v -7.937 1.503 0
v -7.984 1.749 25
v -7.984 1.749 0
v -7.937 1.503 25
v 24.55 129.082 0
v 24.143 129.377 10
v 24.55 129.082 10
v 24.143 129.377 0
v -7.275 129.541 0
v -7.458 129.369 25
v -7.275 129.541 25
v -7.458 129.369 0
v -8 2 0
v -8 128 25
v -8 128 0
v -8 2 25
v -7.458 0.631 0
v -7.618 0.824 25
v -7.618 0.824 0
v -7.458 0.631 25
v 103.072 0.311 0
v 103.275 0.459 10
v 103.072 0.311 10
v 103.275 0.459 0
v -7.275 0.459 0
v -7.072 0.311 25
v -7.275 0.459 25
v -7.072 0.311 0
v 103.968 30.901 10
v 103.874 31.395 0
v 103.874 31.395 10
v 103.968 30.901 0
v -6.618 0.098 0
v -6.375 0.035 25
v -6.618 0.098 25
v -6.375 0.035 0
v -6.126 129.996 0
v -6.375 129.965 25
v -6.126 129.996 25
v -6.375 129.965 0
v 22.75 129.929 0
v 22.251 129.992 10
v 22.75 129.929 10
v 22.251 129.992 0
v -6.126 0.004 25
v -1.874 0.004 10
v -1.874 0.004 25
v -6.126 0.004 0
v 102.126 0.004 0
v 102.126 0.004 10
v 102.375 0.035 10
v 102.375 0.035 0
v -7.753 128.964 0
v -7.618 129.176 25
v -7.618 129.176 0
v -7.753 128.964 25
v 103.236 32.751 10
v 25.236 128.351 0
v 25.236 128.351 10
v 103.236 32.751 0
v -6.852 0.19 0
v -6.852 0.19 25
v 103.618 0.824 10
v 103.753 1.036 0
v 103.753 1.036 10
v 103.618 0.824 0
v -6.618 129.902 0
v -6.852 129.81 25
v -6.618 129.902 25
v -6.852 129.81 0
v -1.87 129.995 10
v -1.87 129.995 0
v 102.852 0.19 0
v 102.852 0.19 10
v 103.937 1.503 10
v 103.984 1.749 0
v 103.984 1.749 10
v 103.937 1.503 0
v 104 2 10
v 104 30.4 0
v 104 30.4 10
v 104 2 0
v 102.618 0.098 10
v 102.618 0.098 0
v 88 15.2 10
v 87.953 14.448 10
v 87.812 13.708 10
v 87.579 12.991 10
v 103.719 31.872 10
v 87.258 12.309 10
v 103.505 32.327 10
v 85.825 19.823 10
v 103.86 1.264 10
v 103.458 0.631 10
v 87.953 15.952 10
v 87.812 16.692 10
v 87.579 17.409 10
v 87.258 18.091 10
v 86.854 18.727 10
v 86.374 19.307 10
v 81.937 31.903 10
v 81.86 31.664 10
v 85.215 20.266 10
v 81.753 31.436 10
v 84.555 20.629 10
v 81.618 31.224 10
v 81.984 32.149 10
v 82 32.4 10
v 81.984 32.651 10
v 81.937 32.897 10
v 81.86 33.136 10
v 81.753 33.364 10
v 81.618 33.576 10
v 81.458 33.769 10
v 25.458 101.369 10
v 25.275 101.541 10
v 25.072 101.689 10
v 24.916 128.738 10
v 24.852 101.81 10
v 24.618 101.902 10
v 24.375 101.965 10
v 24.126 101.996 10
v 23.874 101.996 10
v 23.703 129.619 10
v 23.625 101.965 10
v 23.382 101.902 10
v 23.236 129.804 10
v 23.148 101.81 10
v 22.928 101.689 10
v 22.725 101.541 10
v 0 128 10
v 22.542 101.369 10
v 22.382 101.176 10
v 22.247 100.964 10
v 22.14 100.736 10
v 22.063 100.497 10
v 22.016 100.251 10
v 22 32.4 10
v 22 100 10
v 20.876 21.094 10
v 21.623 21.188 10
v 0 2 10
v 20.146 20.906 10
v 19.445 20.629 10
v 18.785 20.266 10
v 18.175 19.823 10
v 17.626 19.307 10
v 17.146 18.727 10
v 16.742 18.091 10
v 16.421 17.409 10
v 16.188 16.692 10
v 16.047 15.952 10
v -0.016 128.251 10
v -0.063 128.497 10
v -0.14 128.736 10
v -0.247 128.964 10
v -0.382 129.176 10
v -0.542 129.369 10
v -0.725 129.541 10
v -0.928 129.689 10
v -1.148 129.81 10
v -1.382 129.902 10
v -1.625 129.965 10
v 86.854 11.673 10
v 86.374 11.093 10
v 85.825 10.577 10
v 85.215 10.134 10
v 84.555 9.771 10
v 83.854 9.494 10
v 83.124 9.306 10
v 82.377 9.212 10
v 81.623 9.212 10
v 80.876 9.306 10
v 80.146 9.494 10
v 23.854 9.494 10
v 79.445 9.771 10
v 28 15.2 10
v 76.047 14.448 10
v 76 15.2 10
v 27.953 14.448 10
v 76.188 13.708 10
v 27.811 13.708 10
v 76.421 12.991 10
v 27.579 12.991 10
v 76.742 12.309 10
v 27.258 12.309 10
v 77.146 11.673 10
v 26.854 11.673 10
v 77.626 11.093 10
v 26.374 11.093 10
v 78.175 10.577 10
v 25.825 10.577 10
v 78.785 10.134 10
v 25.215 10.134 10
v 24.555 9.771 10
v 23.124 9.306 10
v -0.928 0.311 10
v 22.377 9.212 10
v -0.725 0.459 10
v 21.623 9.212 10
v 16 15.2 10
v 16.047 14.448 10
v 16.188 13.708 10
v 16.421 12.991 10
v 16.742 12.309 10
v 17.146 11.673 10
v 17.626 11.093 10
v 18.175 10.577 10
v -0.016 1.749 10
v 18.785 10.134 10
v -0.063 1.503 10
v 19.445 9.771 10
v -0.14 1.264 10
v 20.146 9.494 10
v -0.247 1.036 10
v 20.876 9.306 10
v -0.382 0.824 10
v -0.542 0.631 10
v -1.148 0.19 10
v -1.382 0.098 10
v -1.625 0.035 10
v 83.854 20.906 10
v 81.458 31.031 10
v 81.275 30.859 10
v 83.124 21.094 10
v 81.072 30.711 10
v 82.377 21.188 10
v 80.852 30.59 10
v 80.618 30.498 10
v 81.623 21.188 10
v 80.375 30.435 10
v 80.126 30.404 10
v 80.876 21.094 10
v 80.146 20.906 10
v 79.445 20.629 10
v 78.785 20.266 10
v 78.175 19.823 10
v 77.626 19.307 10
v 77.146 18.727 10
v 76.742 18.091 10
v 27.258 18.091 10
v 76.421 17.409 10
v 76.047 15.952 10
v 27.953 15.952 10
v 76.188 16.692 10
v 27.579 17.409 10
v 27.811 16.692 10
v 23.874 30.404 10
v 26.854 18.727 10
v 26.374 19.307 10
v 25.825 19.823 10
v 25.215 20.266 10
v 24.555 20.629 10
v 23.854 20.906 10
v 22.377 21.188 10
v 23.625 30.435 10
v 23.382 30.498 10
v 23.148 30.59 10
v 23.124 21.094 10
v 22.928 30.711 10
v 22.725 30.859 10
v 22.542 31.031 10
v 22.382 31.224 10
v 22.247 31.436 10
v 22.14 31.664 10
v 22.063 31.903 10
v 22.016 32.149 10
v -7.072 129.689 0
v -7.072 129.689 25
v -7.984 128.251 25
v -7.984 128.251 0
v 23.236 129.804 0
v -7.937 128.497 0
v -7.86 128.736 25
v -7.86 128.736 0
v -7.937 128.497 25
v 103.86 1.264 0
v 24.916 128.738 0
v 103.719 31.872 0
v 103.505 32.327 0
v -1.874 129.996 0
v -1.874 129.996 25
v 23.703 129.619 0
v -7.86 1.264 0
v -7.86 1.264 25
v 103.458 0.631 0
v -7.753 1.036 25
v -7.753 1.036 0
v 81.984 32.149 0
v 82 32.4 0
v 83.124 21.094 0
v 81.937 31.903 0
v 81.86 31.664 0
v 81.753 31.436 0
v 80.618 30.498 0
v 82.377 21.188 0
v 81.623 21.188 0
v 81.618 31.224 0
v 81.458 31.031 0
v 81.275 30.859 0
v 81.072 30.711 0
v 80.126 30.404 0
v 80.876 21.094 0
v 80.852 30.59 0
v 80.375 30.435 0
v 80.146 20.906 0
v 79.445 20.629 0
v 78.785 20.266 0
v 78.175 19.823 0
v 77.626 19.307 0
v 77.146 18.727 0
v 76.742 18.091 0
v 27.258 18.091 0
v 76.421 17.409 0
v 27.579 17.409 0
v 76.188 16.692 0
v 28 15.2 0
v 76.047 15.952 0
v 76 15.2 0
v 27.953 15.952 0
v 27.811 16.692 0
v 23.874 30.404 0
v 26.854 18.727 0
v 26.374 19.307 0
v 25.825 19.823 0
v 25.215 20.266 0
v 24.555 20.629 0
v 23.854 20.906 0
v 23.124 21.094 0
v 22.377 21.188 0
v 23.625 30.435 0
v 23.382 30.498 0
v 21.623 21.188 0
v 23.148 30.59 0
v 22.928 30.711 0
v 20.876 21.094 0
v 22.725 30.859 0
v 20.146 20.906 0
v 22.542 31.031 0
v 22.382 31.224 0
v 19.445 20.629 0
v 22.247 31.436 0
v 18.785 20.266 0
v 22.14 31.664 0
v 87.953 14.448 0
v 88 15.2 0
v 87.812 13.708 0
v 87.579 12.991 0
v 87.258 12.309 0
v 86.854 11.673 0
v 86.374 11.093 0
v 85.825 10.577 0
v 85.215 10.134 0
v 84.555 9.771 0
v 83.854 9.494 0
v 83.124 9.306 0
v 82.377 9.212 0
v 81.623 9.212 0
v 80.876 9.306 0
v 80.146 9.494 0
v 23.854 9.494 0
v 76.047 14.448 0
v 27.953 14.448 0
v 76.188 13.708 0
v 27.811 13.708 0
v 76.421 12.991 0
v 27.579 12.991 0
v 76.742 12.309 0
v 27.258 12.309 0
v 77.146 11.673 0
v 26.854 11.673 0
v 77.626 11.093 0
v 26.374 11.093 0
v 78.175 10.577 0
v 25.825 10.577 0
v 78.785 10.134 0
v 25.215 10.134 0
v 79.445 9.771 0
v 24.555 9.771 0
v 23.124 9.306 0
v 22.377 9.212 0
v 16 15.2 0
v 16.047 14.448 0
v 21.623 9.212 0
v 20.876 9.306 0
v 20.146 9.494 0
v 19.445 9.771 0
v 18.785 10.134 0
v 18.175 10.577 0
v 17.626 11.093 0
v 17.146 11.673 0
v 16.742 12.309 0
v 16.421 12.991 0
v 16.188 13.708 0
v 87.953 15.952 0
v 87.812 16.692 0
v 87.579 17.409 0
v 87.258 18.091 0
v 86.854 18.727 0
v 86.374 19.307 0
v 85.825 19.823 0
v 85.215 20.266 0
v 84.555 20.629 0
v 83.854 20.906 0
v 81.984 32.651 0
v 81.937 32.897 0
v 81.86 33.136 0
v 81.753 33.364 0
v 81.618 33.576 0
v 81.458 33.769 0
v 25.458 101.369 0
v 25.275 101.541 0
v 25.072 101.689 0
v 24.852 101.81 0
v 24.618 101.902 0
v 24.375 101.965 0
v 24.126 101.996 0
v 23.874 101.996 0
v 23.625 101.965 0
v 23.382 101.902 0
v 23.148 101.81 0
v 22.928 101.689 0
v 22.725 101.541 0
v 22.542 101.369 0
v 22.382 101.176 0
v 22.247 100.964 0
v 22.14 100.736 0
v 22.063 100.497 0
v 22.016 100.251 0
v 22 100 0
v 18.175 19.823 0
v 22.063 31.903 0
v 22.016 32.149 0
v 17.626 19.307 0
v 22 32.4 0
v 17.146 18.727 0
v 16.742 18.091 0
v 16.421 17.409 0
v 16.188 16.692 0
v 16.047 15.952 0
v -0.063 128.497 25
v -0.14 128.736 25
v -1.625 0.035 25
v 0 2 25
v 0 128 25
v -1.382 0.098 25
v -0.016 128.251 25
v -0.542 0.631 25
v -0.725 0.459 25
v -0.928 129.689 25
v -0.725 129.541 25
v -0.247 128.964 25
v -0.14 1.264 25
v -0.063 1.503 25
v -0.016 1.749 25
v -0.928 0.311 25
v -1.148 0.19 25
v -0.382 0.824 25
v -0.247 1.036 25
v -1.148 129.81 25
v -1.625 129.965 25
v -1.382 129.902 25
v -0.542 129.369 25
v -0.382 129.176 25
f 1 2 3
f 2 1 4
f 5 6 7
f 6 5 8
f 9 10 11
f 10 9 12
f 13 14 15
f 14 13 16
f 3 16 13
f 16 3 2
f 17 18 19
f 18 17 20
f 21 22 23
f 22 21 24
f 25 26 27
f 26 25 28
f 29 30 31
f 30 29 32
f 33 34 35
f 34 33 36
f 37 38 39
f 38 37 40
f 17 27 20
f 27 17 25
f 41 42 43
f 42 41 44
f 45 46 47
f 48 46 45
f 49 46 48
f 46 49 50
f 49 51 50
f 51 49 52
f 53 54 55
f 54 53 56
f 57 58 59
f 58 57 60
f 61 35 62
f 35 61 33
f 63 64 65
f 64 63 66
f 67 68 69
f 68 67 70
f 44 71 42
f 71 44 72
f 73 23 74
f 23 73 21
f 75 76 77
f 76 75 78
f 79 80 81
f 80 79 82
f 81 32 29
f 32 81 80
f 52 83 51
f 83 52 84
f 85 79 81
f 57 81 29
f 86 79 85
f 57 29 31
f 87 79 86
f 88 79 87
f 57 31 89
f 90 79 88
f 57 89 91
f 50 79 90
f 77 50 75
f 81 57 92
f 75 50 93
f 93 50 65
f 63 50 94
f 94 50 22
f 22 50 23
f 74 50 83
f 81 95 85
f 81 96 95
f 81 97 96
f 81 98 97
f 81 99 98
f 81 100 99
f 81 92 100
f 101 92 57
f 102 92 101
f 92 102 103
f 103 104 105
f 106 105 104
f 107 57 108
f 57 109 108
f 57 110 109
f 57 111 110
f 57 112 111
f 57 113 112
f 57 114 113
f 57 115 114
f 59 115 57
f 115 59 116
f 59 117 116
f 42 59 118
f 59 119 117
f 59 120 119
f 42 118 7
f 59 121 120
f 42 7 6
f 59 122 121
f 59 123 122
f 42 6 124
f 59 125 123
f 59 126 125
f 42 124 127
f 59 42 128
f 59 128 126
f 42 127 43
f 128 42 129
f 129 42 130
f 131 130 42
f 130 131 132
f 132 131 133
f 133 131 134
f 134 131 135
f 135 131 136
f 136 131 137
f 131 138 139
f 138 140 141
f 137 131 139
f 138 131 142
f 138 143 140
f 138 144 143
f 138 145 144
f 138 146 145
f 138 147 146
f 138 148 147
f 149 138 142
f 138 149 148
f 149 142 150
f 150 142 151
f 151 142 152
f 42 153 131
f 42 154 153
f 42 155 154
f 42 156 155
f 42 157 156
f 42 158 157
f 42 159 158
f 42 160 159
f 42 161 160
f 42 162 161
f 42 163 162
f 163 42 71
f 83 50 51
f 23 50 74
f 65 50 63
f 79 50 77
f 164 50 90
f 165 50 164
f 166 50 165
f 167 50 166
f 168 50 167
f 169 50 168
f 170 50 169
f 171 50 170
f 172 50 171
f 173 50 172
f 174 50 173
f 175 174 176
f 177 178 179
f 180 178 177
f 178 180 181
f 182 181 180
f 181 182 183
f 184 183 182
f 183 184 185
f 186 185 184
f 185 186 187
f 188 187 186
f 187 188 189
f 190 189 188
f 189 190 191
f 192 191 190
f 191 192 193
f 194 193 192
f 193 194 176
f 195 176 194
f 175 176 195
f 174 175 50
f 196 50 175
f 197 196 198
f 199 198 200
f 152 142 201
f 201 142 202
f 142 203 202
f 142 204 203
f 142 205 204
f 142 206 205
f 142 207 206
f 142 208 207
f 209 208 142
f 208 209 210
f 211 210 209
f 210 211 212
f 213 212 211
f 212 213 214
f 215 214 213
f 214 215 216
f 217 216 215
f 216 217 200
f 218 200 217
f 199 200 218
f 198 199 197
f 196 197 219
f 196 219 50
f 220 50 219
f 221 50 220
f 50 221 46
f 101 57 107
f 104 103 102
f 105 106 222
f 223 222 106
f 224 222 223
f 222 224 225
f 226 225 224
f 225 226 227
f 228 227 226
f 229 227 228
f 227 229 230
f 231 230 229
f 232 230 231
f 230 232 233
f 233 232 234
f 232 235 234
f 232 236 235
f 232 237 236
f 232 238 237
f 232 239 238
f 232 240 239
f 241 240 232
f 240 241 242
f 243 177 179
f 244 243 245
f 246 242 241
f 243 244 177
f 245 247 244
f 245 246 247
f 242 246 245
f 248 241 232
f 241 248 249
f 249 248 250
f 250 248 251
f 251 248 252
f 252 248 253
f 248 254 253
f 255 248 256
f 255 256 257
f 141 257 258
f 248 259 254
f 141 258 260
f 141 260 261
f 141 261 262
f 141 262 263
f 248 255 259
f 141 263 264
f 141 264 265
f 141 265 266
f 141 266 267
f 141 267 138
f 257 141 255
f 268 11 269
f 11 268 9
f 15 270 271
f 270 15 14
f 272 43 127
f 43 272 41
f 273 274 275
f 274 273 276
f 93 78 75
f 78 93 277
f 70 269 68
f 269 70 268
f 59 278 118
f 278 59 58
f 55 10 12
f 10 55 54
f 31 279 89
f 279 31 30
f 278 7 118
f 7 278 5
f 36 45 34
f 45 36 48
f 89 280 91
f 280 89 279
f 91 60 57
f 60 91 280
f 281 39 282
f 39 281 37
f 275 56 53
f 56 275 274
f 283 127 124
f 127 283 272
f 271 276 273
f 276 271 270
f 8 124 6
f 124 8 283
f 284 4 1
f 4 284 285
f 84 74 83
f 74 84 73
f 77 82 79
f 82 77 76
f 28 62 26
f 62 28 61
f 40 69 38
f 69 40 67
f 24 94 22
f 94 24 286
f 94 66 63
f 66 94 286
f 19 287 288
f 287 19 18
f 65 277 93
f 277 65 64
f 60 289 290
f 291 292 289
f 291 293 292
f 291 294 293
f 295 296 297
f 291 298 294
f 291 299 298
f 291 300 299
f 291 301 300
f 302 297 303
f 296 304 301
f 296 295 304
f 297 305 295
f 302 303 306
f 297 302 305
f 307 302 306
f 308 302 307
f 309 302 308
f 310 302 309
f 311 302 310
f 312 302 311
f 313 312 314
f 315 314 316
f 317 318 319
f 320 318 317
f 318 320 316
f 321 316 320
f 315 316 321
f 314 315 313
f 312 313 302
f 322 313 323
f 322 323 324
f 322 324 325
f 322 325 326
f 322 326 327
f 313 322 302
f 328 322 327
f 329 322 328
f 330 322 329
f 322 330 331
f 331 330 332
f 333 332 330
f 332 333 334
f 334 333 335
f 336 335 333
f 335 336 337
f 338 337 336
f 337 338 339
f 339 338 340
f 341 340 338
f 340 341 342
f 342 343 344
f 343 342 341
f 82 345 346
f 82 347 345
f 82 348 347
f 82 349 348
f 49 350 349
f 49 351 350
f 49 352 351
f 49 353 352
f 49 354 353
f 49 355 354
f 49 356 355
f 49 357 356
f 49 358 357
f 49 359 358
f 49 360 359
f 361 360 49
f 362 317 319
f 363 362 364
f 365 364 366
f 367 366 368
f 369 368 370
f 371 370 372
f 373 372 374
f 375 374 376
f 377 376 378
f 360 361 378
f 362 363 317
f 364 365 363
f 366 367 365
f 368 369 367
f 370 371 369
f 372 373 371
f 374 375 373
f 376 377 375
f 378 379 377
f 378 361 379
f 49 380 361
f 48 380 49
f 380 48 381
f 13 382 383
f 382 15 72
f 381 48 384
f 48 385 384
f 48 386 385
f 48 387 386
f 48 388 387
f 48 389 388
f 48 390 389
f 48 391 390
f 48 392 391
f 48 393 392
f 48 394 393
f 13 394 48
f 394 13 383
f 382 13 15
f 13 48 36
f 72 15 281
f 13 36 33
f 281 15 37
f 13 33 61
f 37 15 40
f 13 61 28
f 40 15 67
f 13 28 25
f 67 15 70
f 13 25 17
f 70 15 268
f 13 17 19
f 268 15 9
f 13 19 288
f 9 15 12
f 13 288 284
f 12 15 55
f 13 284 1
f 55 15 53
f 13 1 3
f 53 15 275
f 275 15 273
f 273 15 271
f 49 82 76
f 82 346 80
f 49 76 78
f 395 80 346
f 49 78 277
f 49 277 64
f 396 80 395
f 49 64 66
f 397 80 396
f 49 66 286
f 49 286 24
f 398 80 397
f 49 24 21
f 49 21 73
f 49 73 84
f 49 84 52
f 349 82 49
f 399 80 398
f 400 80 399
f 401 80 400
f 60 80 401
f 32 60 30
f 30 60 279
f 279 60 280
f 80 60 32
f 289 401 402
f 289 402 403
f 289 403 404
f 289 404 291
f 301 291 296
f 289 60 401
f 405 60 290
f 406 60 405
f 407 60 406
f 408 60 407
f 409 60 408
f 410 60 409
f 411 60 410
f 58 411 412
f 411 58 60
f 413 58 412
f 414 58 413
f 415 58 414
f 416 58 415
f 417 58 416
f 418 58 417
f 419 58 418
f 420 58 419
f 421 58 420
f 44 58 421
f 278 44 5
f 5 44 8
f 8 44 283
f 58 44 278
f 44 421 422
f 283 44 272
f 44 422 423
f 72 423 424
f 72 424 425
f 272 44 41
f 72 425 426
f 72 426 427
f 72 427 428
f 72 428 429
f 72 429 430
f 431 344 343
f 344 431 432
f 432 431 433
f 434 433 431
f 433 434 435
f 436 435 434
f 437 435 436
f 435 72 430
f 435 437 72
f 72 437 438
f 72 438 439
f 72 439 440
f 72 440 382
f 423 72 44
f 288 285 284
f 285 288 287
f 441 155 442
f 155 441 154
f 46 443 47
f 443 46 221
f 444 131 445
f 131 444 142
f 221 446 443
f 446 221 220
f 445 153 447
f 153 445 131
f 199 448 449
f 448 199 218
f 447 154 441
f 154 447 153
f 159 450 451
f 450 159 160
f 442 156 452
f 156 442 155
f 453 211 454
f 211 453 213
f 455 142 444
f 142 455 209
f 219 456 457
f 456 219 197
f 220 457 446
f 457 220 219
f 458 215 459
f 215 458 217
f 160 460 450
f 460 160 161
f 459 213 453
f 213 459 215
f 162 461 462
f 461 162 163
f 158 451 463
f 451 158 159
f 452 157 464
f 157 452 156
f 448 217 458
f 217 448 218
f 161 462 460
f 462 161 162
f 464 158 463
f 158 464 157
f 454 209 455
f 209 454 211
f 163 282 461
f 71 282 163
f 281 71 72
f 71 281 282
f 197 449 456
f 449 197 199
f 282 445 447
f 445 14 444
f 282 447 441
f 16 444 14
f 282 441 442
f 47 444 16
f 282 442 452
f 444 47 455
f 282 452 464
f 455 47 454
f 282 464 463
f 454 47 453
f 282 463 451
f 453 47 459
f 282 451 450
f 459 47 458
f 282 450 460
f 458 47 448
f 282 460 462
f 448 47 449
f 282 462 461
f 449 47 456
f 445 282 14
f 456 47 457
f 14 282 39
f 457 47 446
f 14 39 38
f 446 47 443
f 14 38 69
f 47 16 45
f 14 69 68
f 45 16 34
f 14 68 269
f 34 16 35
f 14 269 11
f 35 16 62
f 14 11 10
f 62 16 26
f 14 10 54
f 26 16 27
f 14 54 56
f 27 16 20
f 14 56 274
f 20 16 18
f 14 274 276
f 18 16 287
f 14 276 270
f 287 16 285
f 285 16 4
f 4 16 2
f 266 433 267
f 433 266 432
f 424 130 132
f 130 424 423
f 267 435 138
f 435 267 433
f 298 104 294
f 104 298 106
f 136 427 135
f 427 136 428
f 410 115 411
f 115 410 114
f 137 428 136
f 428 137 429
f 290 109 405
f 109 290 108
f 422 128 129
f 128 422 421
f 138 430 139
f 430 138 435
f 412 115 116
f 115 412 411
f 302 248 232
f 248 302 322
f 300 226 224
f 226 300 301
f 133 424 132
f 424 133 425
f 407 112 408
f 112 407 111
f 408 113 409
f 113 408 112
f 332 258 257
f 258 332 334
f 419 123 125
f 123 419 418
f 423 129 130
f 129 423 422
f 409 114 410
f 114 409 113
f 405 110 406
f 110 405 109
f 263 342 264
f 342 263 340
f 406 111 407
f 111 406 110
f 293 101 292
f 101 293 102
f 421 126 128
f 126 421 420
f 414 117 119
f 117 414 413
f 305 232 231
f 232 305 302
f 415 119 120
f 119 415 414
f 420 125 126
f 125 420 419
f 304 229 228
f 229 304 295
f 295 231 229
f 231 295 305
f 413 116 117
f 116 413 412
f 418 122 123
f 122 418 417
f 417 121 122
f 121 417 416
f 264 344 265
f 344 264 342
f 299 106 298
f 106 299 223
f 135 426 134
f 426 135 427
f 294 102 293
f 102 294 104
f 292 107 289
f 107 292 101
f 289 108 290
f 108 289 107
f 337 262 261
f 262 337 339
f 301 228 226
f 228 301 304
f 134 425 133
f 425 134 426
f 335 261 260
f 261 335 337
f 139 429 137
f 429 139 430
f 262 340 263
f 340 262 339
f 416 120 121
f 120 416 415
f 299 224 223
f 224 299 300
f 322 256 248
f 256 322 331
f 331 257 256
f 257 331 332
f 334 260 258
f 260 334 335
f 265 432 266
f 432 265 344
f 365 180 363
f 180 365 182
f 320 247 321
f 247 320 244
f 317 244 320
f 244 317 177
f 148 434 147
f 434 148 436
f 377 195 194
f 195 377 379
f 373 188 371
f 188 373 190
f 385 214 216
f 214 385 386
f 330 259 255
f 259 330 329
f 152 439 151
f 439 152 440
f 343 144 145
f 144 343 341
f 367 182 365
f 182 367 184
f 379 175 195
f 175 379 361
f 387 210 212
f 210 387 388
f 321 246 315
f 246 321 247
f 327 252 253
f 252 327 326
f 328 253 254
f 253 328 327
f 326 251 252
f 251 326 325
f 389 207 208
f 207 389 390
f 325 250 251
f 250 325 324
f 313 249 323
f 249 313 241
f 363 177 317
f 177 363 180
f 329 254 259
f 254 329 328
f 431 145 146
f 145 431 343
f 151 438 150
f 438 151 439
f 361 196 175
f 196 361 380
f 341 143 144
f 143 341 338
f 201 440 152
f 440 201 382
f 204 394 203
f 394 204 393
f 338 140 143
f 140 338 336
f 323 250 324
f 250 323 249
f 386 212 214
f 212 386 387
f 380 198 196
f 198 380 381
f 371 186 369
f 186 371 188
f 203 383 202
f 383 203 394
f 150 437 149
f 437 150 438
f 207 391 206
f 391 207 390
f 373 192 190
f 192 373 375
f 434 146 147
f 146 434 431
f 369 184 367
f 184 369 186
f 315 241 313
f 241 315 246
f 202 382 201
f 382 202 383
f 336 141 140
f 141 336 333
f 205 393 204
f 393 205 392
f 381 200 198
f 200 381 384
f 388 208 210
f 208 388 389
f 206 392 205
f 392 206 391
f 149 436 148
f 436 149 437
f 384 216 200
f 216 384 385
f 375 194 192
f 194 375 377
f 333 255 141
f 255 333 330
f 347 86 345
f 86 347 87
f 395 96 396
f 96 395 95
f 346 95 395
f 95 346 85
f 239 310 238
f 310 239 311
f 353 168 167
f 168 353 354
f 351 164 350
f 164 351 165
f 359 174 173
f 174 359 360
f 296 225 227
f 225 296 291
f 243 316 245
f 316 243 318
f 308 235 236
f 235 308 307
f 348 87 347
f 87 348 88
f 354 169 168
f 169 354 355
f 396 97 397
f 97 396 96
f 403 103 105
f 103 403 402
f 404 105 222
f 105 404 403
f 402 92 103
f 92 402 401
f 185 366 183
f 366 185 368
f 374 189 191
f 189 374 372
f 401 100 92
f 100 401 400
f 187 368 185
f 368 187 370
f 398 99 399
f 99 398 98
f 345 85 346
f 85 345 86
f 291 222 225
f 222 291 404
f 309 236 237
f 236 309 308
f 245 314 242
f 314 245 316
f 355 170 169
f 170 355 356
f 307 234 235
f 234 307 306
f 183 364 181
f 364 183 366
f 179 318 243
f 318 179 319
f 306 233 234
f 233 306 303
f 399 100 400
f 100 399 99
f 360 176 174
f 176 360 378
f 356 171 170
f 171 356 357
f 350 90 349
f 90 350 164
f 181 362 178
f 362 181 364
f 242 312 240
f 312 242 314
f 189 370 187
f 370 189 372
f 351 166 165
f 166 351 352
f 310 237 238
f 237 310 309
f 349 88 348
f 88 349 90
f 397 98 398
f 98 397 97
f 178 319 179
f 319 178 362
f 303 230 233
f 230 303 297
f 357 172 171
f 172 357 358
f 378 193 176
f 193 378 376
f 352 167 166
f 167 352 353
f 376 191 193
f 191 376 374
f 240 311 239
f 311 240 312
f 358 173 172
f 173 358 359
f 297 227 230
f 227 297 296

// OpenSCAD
include <MCAD/nuts_and_bolts.scad>;

bearingWidth=44;   // Actually 42 but give ourselves a little space...
bearingLength=40;  // actually 36 but give ourselves a lttle space...
bearingHoleSpaceX=30.5;
bearingHoleSpaceY=26;
plateThickness=5;
plateThicknessB=10;
endplateThickness=10;
endplateThicknessB=5;
M5HoleRadius=5.5/2;
M25HoleRadius=3.0/2;
middleGap = 50;
bearingDiameter=26;
bearingShelfW=1.5;
bearingShelfD=1.5;
idlerDiameter=22;
idlerBore=8;
idlerDepth=7;
explode=1;
rodZ=15.2;
plateSpace=29;
hump=20;

$fn=50;
// Tolerances for geometry connections.
AT=0.02;
ST=AT*2;
TT=AT/2;

rodDiameter = 12;
rodCenters = 60;

endPlateThickness = 10;
endPlateLength = rodCenters + rodDiameter + 4;
endPlateHeight = rodDiameter + 4;

tabLength=40;
tabHeight=40;

module roundedRect(size, radius)
{
    x = size[0];
    y = size[1];
    z = size[2];
    linear_extrude(height=z)
    hull()
    {
        // place 4 circles in the corners, with the given radius
        translate([radius, radius, 0])
            circle(r=radius);
        translate([x-radius, radius, 0])
            circle(r=radius);
        translate([radius, y-radius, 0])
            circle(r=radius);
        translate([x-radius, y-radius, 0])
            circle(r=radius);
    }
}

//Draw a prism based on a 
//right angled triangle
//l - length of prism
//w - width of triangle
//h - height of triangle
module prism(l, w, h) {
       polyhedron(points=[
               [0,0,h],           // 0    front top corner
               [0,0,0],[w,0,0],   // 1, 2 front left & right bottom corners
               [0,l,h],           // 3    back top corner
               [0,l,0],[w,l,0]    // 4, 5 back left & right bottom corners
       ], faces=[ // points for all faces must be ordered clockwise when looking in
               [0,2,1],    // top face
               [3,4,5],    // base face
               [0,1,4,3],  // h face
               [1,2,5,4],  // w face
               [0,3,5,2],  // hypotenuse face
       ]);
}


module csk_bolt(dia,len,csk)
{
  h1=0.6*dia;
  cylinder(r=dia/2,len);
  if(csk)
    translate([0,0,len-h1])
      cylinder(r2=dia,r1=dia/2,h=h1);
}

module bearingHoles(h=plateThickness, csk=true, bw = bearingWidth, bl = bearingLength, sx = bearingHoleSpaceX, sy = bearingHoleSpaceY)
{
  bearingHoleEdge=(bw-sx)/2;
  bearingHoleEdgeY=(bl-sy)/2;
  bearingHoleEdge2=bearingHoleEdge+sx;
  bearingHoleEdge2Y=bearingHoleEdgeY+sy;
  translate([bearingHoleEdge,bearingHoleEdgeY,0])
    csk_bolt(M5HoleRadius*2,h,csk);
  translate([bearingHoleEdge,bearingHoleEdge2Y,0])
    csk_bolt(M5HoleRadius*2,h,csk);
  translate([bearingHoleEdge2,bearingHoleEdgeY,0])
    csk_bolt(M5HoleRadius*2,h,csk);
  translate([bearingHoleEdge2,bearingHoleEdge2Y,0])
    csk_bolt(M5HoleRadius*2,h,csk);
}

module sliderplate(left=true, holes=true, holerad=3)
{
  difference()
  {
    union()
    {
      translate([0,-tabLength,0])
        roundedRect([tabHeight, tabLength+10,plateThickness],2);
      roundedRect([bearingWidth+rodCenters,bearingLength*2+middleGap,plateThickness],2);
      translate([(rodCenters+bearingWidth)/2,bearingLength+middleGap*0.5,0])
        cylinder(d=bearingDiameter+8, h=plateThicknessB);
      translate([0,-10,0]) cube([tabHeight+10,12,plateThickness]);
    }
    bearingHoles();
    translate([tabHeight/2,-tabLength+10,0])
       csk_bolt(M5HoleRadius*2,plateThickness,true);
    translate([tabHeight,-20,-1])
      roundedRect([20,20,plateThickness+2],2);

    translate([rodCenters,0,0]) bearingHoles();
    translate([0,bearingLength+middleGap,0]) bearingHoles();
    translate([rodCenters,bearingLength+middleGap,0]) bearingHoles();
    translate([(rodCenters+bearingWidth)/2,bearingLength+middleGap*0.5,0])
      union()
      {
        cylinder(d=bearingDiameter-bearingShelfW, h=plateThicknessB);
        translate([0,0,bearingShelfD])
          cylinder(d=bearingDiameter, h=plateThicknessB-bearingShelfD);
      }
    translate([idlerBore/2 + 4, bearingLength+idlerDiameter/2,0]) 
        cylinder(d=idlerBore,h=plateThickness);
    translate([idlerBore/2 + 4, bearingLength+middleGap-idlerDiameter/2,0]) 
        cylinder(d=idlerBore,h=plateThickness);
    if (holes)
    {
      translate([bearingWidth/2-10,bearingLength/2-8,0]) roundedRect([20,16,plateThickness],holerad);
      translate([bearingWidth/2-10+rodCenters,bearingLength/2-8,0]) roundedRect([20,16,plateThickness],holerad);
      translate([bearingWidth/2-10,bearingLength*1.5+middleGap-8,0]) roundedRect([20,16,plateThickness],holerad);
      translate([bearingWidth/2-10+rodCenters,bearingLength*1.5+middleGap-8,0]) roundedRect([20,16,plateThickness],holerad);
      translate([idlerBore+8,bearingLength,0]) roundedRect([20+(bearingWidth/2-10)-(idlerBore+8),middleGap,plateThickness],holerad);
      translate([bearingWidth/2-10+rodCenters,bearingLength,0]) roundedRect([20,middleGap,plateThickness],holerad);
      translate([bearingWidth/2-10+rodCenters/2,bearingLength*1.5+middleGap-8,0]) roundedRect([20,16,plateThickness],holerad);
      translate([bearingWidth/2-10+rodCenters/2,bearingLength*0.5-8,0]) roundedRect([20,16,plateThickness],holerad);
      translate([10,-tabLength+20,0]) roundedRect([tabHeight-20,tabLength-20,plateThickness],holerad);
    }
  }
}

module idler()
{
  difference()
  {
    cylinder(d=idlerDiameter,h=idlerDepth);
    cylinder(d=idlerBore,h=idlerDepth);
  }
}

module rod()
{
  translate([0,-50,-rodZ]) rotate([-90,0,0]) cylinder(d=12,h=bearingLength*2+middleGap+100);
}

module bottomPlate()
{
  intersection()
    {
      sliderplate(holes=false);
      translate([bearingWidth/2+hump/2,bearingLength/2+bearingHoleSpaceY/2-6,0]) roundedRect([rodCenters-hump,middleGap+bearingLength-bearingHoleSpaceY/2,plateThicknessB], 2);
    }
}

module end()
{
  additionalHeight = idlerDiameter/2-(idlerBore/2 + 4);
  difference()
  {
    union()
    {
      linear_extrude(height=endplateThickness)
        hull()
        {
          translate([2-additionalHeight-endplateThicknessB,2,0]) circle(r=2);
          translate([bearingWidth+rodCenters-2,2,0]) circle(r=2);
          translate([bearingWidth+rodCenters-4,rodZ*2,0]) circle(r=4);
          translate([2-additionalHeight-endplateThicknessB,bearingLength*2+middleGap-2,0]) circle(r=2);
          translate([bearingWidth/2,bearingLength*2+middleGap-4,0]) circle(r=4);
        }
        translate([-additionalHeight-endplateThicknessB,0,0])
          roundedRect([additionalHeight+endplateThicknessB, bearingLength*2+middleGap, endplateThickness+15], 2);
    }
    translate([bearingWidth/2,rodZ*2,-1])
      linear_extrude(height=endplateThickness+2)
        hull()
        {
          translate([2,2,0]) circle(r=2);
          translate([rodCenters-2,2,0]) circle(r=2);
          translate([2,bearingLength*2+middleGap-8-rodZ*2-bearingWidth/2,0]) circle(r=2);

       //   translate([bearingWidth+rodCenters-1,rodZ*2,0]) circle(r=2)          
         // translate([1,bearingLength*2+middleGap-1,0]) circle(r=2);
         // translate([15,bearingLength*2+middleGap-1,0]) circle(r=2);
        } 
    translate([bearingWidth/2,rodZ,-1])
      cylinder(d=12,h=endplateThickness+2);
    translate([bearingWidth/2 + rodCenters,rodZ,-1])
      cylinder(d=12,h=endplateThickness+2);
  }
}

/*
rotate([0,-90,180]) {
    
sliderplate(left=true);
 translate([0,0,-plateSpace]) mirror([0,0,1]) bottomPlate();
bottomPlate();

translate([bearingWidth/2,0,0]) rod();
translate([rodCenters+bearingWidth/2,0,0]) rod();
translate([idlerBore/2 + 4, bearingLength+idlerDiameter/2,-idlerDepth - explode]) idler();
translate([idlerBore/2 + 4, bearingLength+middleGap-idlerDiameter/2,-idlerDepth - explode]) idler();
translate([(rodCenters+bearingWidth)/2,bearingLength+middleGap/2,-16-explode]) import("/Users/rchapman/Documents/OpenSCAD/libraries/MXL32.stl");
rotate([-90,0,0])
  translate([0,0, - tabLength - 20]) 
    end();
}
*/
end();
